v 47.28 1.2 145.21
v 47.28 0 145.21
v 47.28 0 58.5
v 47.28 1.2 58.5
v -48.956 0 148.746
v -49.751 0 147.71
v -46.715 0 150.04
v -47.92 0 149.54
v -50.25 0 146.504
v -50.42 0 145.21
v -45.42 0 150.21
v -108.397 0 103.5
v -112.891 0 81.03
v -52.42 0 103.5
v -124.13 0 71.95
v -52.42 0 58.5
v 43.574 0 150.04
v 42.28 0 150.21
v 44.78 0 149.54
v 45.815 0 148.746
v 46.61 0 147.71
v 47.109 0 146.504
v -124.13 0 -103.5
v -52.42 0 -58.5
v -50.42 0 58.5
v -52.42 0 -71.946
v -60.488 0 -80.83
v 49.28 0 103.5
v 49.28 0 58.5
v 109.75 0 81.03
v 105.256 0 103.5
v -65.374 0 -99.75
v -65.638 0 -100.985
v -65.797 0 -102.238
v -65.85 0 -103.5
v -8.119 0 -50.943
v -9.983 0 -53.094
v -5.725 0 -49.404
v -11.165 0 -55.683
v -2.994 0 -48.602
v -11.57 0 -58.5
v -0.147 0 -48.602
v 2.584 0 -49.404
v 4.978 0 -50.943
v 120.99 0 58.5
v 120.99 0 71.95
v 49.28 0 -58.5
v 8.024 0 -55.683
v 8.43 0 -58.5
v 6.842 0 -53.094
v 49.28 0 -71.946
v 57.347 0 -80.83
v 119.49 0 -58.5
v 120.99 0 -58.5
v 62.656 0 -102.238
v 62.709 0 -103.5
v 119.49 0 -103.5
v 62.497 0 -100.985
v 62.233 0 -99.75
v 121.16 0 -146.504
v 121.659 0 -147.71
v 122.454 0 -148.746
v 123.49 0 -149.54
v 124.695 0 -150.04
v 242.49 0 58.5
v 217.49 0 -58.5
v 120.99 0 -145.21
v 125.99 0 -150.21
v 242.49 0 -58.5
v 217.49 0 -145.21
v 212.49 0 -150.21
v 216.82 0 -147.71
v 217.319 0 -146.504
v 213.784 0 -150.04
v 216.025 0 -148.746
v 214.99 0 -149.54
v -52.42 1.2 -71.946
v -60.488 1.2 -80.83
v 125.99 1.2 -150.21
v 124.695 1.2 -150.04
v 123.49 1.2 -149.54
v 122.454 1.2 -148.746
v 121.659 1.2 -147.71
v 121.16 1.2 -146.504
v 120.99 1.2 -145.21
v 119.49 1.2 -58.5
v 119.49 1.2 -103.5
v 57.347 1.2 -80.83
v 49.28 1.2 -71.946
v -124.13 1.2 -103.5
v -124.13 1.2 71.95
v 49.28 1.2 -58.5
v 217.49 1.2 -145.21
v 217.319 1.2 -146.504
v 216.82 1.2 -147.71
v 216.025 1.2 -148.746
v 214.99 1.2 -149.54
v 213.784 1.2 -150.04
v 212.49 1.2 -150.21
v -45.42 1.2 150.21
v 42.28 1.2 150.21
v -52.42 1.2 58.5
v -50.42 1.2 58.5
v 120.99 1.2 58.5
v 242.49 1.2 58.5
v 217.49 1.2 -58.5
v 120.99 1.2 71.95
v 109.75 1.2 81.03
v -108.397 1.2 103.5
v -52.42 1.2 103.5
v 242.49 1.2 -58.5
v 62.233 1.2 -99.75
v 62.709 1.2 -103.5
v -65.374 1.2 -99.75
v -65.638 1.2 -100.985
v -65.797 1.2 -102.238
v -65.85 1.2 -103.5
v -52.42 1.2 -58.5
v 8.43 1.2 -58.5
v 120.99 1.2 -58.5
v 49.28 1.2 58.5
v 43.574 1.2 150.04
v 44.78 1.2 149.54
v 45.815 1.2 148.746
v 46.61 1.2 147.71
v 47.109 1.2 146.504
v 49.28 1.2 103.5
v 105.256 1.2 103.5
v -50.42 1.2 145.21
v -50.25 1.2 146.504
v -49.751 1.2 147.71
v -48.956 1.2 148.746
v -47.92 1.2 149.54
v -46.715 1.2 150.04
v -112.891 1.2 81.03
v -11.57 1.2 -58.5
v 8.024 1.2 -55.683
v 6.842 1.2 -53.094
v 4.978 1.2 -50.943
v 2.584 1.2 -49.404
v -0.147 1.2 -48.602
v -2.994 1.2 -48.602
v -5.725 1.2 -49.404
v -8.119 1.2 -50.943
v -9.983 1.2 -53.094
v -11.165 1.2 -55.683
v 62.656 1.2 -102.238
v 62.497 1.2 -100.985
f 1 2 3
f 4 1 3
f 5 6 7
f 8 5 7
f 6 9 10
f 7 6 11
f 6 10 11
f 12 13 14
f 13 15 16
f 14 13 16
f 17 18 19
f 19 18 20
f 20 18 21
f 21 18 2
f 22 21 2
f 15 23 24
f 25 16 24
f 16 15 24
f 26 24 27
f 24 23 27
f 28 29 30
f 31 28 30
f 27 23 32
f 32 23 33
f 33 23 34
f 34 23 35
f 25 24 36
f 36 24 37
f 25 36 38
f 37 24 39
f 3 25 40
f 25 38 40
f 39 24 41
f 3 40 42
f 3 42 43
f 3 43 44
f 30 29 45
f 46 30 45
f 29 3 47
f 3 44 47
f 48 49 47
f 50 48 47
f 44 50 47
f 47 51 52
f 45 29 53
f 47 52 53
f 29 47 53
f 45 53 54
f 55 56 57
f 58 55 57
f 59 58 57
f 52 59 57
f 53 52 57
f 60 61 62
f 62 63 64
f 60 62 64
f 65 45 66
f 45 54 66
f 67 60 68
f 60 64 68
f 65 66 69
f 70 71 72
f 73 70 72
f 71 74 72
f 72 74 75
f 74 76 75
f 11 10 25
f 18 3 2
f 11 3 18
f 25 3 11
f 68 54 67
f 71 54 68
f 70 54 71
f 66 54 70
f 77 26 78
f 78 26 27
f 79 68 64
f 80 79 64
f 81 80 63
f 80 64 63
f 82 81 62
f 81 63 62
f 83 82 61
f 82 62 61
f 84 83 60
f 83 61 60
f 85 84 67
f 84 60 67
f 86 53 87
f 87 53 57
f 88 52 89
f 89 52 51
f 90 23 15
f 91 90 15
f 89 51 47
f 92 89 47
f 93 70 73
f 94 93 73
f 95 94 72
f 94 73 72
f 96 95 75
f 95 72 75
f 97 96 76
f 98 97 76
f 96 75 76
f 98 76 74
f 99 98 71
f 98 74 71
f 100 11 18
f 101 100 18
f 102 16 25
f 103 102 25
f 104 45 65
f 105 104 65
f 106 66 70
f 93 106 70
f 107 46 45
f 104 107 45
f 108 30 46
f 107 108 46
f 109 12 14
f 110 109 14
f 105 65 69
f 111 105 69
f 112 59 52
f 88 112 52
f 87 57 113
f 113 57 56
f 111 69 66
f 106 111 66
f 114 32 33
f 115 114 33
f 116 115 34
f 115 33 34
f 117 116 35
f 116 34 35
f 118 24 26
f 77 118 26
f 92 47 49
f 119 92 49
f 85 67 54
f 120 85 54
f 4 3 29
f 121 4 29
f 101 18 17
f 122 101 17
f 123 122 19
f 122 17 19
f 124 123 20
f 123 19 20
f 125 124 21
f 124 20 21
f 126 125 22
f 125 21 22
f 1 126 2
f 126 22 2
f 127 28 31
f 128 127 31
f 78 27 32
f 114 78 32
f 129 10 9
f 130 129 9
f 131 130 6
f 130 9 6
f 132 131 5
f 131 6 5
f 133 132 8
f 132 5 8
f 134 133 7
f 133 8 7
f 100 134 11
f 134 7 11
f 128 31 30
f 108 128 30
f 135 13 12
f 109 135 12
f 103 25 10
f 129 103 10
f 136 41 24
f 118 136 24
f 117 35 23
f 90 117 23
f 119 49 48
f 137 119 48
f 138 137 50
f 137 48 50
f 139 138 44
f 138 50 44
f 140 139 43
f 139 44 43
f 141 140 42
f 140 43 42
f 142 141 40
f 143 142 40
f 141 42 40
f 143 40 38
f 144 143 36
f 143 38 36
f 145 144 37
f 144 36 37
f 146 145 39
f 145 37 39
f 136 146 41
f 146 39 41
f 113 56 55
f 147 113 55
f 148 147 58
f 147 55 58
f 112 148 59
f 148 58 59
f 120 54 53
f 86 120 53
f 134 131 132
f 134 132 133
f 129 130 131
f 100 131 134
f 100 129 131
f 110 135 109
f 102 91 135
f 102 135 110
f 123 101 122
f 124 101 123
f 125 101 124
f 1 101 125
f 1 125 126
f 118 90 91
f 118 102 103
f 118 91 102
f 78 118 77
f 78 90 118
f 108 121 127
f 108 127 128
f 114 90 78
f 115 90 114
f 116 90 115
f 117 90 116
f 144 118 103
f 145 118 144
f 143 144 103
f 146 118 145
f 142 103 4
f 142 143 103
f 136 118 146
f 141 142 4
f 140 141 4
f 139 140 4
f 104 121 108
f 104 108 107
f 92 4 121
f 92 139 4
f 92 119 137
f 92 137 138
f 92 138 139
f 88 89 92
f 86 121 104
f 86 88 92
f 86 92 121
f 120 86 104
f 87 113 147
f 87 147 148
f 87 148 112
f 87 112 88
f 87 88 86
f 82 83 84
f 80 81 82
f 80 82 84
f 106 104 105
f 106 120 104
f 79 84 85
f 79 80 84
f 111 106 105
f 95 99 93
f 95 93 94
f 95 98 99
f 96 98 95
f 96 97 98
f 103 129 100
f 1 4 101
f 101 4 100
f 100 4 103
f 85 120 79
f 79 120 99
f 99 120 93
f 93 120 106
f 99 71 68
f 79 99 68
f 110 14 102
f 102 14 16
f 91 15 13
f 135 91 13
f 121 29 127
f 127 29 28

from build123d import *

# Parameters (mm, degrees)
BOSS_EXTRUDE1_DEPTH = 1.2


with BuildPart() as part:
    # Sketch1 → Boss-Extrude1 (new body)
    with BuildSketch(Plane(origin=(0, 0, 0), x_dir=(1, 0, 0), z_dir=(0, 1, 0))):
        with BuildLine():
            Line((-52.420457213, 58.5), (-52.420457213, 71.946194901))
            Line((-52.420457213, 71.946194901), (-60.488236819, 80.830210159))
            Line((-60.488236819, 80.830210159), (-65.373616564, 99.749725089))
            ThreePointArc((-65.373616564, 99.749725089), (-65.730427555, 101.60979478), (-65.85, 103.5))
            Line((-65.85, 103.5), (-124.130457213, 103.5))
            Line((-124.130457213, 103.5), (-124.130457213, -71.95))
            Line((-124.130457213, -71.95), (-112.891350531, -81.0301662))
            Line((-112.891350531, -81.0301662), (-108.397048281, -103.5))
            Line((-108.397048281, -103.5), (-52.420457213, -103.5))
            Line((-52.420457213, -103.5), (-52.420457213, -58.5))
            Line((-52.420457213, -58.5), (-50.420457213, -58.5))
            Line((-50.420457213, -58.5), (-50.420457213, -145.21))
            ThreePointArc((-50.420457213, -145.21), (-48.955991119, -148.745533906), (-45.420457213, -150.21))
            Line((-45.420457213, -150.21), (42.279542787, -150.21))
            ThreePointArc((42.279542787, -150.21), (45.815076693, -148.745533906), (47.279542787, -145.21))
            Line((47.279542787, -145.21), (47.279542787, -58.5))
            Line((47.279542787, -58.5), (49.279542787, -58.5))
            Line((49.279542787, -58.5), (49.279542787, -103.5))
            Line((49.279542787, -103.5), (105.256133855, -103.5))
            Line((105.256133855, -103.5), (109.750436105, -81.0301662))
            Line((109.750436105, -81.0301662), (120.989542787, -71.95))
            Line((120.989542787, -71.95), (120.989542787, -58.5))
            Line((120.989542787, -58.5), (242.489542787, -58.5))
            Line((242.489542787, -58.5), (242.489542787, 58.5))
            Line((242.489542787, 58.5), (217.489542787, 58.5))
            Line((217.489542787, 58.5), (217.489542787, 145.21))
            ThreePointArc((217.489542787, 145.21), (216.025076693, 148.745533906), (212.489542787, 150.21))
            Line((212.489542787, 150.21), (125.989542787, 150.21))
            ThreePointArc((125.989542787, 150.21), (122.454008881, 148.745533906), (120.989542787, 145.21))
            Line((120.989542787, 145.21), (120.989542787, 58.5))
            Line((120.989542787, 58.5), (119.489542787, 58.5))
            Line((119.489542787, 58.5), (119.489542787, 103.5))
            Line((119.489542787, 103.5), (62.709085574, 103.5))
            ThreePointArc((62.709085574, 103.5), (62.589513129, 101.60979478), (62.232702138, 99.749725089))
            Line((62.232702138, 99.749725089), (57.347322393, 80.830210159))
            Line((57.347322393, 80.830210159), (49.279542787, 71.946194901))
            Line((49.279542787, 71.946194901), (49.279542787, 58.5))
            Line((49.279542787, 58.5), (8.429542787, 58.5))
            ThreePointArc((8.429542787, 58.5), (-1.570457213, 48.5), (-11.570457213, 58.5))
            Line((-11.570457213, 58.5), (-52.420457213, 58.5))
        make_face()
    extrude(amount=BOSS_EXTRUDE1_DEPTH)


solid = part.part
